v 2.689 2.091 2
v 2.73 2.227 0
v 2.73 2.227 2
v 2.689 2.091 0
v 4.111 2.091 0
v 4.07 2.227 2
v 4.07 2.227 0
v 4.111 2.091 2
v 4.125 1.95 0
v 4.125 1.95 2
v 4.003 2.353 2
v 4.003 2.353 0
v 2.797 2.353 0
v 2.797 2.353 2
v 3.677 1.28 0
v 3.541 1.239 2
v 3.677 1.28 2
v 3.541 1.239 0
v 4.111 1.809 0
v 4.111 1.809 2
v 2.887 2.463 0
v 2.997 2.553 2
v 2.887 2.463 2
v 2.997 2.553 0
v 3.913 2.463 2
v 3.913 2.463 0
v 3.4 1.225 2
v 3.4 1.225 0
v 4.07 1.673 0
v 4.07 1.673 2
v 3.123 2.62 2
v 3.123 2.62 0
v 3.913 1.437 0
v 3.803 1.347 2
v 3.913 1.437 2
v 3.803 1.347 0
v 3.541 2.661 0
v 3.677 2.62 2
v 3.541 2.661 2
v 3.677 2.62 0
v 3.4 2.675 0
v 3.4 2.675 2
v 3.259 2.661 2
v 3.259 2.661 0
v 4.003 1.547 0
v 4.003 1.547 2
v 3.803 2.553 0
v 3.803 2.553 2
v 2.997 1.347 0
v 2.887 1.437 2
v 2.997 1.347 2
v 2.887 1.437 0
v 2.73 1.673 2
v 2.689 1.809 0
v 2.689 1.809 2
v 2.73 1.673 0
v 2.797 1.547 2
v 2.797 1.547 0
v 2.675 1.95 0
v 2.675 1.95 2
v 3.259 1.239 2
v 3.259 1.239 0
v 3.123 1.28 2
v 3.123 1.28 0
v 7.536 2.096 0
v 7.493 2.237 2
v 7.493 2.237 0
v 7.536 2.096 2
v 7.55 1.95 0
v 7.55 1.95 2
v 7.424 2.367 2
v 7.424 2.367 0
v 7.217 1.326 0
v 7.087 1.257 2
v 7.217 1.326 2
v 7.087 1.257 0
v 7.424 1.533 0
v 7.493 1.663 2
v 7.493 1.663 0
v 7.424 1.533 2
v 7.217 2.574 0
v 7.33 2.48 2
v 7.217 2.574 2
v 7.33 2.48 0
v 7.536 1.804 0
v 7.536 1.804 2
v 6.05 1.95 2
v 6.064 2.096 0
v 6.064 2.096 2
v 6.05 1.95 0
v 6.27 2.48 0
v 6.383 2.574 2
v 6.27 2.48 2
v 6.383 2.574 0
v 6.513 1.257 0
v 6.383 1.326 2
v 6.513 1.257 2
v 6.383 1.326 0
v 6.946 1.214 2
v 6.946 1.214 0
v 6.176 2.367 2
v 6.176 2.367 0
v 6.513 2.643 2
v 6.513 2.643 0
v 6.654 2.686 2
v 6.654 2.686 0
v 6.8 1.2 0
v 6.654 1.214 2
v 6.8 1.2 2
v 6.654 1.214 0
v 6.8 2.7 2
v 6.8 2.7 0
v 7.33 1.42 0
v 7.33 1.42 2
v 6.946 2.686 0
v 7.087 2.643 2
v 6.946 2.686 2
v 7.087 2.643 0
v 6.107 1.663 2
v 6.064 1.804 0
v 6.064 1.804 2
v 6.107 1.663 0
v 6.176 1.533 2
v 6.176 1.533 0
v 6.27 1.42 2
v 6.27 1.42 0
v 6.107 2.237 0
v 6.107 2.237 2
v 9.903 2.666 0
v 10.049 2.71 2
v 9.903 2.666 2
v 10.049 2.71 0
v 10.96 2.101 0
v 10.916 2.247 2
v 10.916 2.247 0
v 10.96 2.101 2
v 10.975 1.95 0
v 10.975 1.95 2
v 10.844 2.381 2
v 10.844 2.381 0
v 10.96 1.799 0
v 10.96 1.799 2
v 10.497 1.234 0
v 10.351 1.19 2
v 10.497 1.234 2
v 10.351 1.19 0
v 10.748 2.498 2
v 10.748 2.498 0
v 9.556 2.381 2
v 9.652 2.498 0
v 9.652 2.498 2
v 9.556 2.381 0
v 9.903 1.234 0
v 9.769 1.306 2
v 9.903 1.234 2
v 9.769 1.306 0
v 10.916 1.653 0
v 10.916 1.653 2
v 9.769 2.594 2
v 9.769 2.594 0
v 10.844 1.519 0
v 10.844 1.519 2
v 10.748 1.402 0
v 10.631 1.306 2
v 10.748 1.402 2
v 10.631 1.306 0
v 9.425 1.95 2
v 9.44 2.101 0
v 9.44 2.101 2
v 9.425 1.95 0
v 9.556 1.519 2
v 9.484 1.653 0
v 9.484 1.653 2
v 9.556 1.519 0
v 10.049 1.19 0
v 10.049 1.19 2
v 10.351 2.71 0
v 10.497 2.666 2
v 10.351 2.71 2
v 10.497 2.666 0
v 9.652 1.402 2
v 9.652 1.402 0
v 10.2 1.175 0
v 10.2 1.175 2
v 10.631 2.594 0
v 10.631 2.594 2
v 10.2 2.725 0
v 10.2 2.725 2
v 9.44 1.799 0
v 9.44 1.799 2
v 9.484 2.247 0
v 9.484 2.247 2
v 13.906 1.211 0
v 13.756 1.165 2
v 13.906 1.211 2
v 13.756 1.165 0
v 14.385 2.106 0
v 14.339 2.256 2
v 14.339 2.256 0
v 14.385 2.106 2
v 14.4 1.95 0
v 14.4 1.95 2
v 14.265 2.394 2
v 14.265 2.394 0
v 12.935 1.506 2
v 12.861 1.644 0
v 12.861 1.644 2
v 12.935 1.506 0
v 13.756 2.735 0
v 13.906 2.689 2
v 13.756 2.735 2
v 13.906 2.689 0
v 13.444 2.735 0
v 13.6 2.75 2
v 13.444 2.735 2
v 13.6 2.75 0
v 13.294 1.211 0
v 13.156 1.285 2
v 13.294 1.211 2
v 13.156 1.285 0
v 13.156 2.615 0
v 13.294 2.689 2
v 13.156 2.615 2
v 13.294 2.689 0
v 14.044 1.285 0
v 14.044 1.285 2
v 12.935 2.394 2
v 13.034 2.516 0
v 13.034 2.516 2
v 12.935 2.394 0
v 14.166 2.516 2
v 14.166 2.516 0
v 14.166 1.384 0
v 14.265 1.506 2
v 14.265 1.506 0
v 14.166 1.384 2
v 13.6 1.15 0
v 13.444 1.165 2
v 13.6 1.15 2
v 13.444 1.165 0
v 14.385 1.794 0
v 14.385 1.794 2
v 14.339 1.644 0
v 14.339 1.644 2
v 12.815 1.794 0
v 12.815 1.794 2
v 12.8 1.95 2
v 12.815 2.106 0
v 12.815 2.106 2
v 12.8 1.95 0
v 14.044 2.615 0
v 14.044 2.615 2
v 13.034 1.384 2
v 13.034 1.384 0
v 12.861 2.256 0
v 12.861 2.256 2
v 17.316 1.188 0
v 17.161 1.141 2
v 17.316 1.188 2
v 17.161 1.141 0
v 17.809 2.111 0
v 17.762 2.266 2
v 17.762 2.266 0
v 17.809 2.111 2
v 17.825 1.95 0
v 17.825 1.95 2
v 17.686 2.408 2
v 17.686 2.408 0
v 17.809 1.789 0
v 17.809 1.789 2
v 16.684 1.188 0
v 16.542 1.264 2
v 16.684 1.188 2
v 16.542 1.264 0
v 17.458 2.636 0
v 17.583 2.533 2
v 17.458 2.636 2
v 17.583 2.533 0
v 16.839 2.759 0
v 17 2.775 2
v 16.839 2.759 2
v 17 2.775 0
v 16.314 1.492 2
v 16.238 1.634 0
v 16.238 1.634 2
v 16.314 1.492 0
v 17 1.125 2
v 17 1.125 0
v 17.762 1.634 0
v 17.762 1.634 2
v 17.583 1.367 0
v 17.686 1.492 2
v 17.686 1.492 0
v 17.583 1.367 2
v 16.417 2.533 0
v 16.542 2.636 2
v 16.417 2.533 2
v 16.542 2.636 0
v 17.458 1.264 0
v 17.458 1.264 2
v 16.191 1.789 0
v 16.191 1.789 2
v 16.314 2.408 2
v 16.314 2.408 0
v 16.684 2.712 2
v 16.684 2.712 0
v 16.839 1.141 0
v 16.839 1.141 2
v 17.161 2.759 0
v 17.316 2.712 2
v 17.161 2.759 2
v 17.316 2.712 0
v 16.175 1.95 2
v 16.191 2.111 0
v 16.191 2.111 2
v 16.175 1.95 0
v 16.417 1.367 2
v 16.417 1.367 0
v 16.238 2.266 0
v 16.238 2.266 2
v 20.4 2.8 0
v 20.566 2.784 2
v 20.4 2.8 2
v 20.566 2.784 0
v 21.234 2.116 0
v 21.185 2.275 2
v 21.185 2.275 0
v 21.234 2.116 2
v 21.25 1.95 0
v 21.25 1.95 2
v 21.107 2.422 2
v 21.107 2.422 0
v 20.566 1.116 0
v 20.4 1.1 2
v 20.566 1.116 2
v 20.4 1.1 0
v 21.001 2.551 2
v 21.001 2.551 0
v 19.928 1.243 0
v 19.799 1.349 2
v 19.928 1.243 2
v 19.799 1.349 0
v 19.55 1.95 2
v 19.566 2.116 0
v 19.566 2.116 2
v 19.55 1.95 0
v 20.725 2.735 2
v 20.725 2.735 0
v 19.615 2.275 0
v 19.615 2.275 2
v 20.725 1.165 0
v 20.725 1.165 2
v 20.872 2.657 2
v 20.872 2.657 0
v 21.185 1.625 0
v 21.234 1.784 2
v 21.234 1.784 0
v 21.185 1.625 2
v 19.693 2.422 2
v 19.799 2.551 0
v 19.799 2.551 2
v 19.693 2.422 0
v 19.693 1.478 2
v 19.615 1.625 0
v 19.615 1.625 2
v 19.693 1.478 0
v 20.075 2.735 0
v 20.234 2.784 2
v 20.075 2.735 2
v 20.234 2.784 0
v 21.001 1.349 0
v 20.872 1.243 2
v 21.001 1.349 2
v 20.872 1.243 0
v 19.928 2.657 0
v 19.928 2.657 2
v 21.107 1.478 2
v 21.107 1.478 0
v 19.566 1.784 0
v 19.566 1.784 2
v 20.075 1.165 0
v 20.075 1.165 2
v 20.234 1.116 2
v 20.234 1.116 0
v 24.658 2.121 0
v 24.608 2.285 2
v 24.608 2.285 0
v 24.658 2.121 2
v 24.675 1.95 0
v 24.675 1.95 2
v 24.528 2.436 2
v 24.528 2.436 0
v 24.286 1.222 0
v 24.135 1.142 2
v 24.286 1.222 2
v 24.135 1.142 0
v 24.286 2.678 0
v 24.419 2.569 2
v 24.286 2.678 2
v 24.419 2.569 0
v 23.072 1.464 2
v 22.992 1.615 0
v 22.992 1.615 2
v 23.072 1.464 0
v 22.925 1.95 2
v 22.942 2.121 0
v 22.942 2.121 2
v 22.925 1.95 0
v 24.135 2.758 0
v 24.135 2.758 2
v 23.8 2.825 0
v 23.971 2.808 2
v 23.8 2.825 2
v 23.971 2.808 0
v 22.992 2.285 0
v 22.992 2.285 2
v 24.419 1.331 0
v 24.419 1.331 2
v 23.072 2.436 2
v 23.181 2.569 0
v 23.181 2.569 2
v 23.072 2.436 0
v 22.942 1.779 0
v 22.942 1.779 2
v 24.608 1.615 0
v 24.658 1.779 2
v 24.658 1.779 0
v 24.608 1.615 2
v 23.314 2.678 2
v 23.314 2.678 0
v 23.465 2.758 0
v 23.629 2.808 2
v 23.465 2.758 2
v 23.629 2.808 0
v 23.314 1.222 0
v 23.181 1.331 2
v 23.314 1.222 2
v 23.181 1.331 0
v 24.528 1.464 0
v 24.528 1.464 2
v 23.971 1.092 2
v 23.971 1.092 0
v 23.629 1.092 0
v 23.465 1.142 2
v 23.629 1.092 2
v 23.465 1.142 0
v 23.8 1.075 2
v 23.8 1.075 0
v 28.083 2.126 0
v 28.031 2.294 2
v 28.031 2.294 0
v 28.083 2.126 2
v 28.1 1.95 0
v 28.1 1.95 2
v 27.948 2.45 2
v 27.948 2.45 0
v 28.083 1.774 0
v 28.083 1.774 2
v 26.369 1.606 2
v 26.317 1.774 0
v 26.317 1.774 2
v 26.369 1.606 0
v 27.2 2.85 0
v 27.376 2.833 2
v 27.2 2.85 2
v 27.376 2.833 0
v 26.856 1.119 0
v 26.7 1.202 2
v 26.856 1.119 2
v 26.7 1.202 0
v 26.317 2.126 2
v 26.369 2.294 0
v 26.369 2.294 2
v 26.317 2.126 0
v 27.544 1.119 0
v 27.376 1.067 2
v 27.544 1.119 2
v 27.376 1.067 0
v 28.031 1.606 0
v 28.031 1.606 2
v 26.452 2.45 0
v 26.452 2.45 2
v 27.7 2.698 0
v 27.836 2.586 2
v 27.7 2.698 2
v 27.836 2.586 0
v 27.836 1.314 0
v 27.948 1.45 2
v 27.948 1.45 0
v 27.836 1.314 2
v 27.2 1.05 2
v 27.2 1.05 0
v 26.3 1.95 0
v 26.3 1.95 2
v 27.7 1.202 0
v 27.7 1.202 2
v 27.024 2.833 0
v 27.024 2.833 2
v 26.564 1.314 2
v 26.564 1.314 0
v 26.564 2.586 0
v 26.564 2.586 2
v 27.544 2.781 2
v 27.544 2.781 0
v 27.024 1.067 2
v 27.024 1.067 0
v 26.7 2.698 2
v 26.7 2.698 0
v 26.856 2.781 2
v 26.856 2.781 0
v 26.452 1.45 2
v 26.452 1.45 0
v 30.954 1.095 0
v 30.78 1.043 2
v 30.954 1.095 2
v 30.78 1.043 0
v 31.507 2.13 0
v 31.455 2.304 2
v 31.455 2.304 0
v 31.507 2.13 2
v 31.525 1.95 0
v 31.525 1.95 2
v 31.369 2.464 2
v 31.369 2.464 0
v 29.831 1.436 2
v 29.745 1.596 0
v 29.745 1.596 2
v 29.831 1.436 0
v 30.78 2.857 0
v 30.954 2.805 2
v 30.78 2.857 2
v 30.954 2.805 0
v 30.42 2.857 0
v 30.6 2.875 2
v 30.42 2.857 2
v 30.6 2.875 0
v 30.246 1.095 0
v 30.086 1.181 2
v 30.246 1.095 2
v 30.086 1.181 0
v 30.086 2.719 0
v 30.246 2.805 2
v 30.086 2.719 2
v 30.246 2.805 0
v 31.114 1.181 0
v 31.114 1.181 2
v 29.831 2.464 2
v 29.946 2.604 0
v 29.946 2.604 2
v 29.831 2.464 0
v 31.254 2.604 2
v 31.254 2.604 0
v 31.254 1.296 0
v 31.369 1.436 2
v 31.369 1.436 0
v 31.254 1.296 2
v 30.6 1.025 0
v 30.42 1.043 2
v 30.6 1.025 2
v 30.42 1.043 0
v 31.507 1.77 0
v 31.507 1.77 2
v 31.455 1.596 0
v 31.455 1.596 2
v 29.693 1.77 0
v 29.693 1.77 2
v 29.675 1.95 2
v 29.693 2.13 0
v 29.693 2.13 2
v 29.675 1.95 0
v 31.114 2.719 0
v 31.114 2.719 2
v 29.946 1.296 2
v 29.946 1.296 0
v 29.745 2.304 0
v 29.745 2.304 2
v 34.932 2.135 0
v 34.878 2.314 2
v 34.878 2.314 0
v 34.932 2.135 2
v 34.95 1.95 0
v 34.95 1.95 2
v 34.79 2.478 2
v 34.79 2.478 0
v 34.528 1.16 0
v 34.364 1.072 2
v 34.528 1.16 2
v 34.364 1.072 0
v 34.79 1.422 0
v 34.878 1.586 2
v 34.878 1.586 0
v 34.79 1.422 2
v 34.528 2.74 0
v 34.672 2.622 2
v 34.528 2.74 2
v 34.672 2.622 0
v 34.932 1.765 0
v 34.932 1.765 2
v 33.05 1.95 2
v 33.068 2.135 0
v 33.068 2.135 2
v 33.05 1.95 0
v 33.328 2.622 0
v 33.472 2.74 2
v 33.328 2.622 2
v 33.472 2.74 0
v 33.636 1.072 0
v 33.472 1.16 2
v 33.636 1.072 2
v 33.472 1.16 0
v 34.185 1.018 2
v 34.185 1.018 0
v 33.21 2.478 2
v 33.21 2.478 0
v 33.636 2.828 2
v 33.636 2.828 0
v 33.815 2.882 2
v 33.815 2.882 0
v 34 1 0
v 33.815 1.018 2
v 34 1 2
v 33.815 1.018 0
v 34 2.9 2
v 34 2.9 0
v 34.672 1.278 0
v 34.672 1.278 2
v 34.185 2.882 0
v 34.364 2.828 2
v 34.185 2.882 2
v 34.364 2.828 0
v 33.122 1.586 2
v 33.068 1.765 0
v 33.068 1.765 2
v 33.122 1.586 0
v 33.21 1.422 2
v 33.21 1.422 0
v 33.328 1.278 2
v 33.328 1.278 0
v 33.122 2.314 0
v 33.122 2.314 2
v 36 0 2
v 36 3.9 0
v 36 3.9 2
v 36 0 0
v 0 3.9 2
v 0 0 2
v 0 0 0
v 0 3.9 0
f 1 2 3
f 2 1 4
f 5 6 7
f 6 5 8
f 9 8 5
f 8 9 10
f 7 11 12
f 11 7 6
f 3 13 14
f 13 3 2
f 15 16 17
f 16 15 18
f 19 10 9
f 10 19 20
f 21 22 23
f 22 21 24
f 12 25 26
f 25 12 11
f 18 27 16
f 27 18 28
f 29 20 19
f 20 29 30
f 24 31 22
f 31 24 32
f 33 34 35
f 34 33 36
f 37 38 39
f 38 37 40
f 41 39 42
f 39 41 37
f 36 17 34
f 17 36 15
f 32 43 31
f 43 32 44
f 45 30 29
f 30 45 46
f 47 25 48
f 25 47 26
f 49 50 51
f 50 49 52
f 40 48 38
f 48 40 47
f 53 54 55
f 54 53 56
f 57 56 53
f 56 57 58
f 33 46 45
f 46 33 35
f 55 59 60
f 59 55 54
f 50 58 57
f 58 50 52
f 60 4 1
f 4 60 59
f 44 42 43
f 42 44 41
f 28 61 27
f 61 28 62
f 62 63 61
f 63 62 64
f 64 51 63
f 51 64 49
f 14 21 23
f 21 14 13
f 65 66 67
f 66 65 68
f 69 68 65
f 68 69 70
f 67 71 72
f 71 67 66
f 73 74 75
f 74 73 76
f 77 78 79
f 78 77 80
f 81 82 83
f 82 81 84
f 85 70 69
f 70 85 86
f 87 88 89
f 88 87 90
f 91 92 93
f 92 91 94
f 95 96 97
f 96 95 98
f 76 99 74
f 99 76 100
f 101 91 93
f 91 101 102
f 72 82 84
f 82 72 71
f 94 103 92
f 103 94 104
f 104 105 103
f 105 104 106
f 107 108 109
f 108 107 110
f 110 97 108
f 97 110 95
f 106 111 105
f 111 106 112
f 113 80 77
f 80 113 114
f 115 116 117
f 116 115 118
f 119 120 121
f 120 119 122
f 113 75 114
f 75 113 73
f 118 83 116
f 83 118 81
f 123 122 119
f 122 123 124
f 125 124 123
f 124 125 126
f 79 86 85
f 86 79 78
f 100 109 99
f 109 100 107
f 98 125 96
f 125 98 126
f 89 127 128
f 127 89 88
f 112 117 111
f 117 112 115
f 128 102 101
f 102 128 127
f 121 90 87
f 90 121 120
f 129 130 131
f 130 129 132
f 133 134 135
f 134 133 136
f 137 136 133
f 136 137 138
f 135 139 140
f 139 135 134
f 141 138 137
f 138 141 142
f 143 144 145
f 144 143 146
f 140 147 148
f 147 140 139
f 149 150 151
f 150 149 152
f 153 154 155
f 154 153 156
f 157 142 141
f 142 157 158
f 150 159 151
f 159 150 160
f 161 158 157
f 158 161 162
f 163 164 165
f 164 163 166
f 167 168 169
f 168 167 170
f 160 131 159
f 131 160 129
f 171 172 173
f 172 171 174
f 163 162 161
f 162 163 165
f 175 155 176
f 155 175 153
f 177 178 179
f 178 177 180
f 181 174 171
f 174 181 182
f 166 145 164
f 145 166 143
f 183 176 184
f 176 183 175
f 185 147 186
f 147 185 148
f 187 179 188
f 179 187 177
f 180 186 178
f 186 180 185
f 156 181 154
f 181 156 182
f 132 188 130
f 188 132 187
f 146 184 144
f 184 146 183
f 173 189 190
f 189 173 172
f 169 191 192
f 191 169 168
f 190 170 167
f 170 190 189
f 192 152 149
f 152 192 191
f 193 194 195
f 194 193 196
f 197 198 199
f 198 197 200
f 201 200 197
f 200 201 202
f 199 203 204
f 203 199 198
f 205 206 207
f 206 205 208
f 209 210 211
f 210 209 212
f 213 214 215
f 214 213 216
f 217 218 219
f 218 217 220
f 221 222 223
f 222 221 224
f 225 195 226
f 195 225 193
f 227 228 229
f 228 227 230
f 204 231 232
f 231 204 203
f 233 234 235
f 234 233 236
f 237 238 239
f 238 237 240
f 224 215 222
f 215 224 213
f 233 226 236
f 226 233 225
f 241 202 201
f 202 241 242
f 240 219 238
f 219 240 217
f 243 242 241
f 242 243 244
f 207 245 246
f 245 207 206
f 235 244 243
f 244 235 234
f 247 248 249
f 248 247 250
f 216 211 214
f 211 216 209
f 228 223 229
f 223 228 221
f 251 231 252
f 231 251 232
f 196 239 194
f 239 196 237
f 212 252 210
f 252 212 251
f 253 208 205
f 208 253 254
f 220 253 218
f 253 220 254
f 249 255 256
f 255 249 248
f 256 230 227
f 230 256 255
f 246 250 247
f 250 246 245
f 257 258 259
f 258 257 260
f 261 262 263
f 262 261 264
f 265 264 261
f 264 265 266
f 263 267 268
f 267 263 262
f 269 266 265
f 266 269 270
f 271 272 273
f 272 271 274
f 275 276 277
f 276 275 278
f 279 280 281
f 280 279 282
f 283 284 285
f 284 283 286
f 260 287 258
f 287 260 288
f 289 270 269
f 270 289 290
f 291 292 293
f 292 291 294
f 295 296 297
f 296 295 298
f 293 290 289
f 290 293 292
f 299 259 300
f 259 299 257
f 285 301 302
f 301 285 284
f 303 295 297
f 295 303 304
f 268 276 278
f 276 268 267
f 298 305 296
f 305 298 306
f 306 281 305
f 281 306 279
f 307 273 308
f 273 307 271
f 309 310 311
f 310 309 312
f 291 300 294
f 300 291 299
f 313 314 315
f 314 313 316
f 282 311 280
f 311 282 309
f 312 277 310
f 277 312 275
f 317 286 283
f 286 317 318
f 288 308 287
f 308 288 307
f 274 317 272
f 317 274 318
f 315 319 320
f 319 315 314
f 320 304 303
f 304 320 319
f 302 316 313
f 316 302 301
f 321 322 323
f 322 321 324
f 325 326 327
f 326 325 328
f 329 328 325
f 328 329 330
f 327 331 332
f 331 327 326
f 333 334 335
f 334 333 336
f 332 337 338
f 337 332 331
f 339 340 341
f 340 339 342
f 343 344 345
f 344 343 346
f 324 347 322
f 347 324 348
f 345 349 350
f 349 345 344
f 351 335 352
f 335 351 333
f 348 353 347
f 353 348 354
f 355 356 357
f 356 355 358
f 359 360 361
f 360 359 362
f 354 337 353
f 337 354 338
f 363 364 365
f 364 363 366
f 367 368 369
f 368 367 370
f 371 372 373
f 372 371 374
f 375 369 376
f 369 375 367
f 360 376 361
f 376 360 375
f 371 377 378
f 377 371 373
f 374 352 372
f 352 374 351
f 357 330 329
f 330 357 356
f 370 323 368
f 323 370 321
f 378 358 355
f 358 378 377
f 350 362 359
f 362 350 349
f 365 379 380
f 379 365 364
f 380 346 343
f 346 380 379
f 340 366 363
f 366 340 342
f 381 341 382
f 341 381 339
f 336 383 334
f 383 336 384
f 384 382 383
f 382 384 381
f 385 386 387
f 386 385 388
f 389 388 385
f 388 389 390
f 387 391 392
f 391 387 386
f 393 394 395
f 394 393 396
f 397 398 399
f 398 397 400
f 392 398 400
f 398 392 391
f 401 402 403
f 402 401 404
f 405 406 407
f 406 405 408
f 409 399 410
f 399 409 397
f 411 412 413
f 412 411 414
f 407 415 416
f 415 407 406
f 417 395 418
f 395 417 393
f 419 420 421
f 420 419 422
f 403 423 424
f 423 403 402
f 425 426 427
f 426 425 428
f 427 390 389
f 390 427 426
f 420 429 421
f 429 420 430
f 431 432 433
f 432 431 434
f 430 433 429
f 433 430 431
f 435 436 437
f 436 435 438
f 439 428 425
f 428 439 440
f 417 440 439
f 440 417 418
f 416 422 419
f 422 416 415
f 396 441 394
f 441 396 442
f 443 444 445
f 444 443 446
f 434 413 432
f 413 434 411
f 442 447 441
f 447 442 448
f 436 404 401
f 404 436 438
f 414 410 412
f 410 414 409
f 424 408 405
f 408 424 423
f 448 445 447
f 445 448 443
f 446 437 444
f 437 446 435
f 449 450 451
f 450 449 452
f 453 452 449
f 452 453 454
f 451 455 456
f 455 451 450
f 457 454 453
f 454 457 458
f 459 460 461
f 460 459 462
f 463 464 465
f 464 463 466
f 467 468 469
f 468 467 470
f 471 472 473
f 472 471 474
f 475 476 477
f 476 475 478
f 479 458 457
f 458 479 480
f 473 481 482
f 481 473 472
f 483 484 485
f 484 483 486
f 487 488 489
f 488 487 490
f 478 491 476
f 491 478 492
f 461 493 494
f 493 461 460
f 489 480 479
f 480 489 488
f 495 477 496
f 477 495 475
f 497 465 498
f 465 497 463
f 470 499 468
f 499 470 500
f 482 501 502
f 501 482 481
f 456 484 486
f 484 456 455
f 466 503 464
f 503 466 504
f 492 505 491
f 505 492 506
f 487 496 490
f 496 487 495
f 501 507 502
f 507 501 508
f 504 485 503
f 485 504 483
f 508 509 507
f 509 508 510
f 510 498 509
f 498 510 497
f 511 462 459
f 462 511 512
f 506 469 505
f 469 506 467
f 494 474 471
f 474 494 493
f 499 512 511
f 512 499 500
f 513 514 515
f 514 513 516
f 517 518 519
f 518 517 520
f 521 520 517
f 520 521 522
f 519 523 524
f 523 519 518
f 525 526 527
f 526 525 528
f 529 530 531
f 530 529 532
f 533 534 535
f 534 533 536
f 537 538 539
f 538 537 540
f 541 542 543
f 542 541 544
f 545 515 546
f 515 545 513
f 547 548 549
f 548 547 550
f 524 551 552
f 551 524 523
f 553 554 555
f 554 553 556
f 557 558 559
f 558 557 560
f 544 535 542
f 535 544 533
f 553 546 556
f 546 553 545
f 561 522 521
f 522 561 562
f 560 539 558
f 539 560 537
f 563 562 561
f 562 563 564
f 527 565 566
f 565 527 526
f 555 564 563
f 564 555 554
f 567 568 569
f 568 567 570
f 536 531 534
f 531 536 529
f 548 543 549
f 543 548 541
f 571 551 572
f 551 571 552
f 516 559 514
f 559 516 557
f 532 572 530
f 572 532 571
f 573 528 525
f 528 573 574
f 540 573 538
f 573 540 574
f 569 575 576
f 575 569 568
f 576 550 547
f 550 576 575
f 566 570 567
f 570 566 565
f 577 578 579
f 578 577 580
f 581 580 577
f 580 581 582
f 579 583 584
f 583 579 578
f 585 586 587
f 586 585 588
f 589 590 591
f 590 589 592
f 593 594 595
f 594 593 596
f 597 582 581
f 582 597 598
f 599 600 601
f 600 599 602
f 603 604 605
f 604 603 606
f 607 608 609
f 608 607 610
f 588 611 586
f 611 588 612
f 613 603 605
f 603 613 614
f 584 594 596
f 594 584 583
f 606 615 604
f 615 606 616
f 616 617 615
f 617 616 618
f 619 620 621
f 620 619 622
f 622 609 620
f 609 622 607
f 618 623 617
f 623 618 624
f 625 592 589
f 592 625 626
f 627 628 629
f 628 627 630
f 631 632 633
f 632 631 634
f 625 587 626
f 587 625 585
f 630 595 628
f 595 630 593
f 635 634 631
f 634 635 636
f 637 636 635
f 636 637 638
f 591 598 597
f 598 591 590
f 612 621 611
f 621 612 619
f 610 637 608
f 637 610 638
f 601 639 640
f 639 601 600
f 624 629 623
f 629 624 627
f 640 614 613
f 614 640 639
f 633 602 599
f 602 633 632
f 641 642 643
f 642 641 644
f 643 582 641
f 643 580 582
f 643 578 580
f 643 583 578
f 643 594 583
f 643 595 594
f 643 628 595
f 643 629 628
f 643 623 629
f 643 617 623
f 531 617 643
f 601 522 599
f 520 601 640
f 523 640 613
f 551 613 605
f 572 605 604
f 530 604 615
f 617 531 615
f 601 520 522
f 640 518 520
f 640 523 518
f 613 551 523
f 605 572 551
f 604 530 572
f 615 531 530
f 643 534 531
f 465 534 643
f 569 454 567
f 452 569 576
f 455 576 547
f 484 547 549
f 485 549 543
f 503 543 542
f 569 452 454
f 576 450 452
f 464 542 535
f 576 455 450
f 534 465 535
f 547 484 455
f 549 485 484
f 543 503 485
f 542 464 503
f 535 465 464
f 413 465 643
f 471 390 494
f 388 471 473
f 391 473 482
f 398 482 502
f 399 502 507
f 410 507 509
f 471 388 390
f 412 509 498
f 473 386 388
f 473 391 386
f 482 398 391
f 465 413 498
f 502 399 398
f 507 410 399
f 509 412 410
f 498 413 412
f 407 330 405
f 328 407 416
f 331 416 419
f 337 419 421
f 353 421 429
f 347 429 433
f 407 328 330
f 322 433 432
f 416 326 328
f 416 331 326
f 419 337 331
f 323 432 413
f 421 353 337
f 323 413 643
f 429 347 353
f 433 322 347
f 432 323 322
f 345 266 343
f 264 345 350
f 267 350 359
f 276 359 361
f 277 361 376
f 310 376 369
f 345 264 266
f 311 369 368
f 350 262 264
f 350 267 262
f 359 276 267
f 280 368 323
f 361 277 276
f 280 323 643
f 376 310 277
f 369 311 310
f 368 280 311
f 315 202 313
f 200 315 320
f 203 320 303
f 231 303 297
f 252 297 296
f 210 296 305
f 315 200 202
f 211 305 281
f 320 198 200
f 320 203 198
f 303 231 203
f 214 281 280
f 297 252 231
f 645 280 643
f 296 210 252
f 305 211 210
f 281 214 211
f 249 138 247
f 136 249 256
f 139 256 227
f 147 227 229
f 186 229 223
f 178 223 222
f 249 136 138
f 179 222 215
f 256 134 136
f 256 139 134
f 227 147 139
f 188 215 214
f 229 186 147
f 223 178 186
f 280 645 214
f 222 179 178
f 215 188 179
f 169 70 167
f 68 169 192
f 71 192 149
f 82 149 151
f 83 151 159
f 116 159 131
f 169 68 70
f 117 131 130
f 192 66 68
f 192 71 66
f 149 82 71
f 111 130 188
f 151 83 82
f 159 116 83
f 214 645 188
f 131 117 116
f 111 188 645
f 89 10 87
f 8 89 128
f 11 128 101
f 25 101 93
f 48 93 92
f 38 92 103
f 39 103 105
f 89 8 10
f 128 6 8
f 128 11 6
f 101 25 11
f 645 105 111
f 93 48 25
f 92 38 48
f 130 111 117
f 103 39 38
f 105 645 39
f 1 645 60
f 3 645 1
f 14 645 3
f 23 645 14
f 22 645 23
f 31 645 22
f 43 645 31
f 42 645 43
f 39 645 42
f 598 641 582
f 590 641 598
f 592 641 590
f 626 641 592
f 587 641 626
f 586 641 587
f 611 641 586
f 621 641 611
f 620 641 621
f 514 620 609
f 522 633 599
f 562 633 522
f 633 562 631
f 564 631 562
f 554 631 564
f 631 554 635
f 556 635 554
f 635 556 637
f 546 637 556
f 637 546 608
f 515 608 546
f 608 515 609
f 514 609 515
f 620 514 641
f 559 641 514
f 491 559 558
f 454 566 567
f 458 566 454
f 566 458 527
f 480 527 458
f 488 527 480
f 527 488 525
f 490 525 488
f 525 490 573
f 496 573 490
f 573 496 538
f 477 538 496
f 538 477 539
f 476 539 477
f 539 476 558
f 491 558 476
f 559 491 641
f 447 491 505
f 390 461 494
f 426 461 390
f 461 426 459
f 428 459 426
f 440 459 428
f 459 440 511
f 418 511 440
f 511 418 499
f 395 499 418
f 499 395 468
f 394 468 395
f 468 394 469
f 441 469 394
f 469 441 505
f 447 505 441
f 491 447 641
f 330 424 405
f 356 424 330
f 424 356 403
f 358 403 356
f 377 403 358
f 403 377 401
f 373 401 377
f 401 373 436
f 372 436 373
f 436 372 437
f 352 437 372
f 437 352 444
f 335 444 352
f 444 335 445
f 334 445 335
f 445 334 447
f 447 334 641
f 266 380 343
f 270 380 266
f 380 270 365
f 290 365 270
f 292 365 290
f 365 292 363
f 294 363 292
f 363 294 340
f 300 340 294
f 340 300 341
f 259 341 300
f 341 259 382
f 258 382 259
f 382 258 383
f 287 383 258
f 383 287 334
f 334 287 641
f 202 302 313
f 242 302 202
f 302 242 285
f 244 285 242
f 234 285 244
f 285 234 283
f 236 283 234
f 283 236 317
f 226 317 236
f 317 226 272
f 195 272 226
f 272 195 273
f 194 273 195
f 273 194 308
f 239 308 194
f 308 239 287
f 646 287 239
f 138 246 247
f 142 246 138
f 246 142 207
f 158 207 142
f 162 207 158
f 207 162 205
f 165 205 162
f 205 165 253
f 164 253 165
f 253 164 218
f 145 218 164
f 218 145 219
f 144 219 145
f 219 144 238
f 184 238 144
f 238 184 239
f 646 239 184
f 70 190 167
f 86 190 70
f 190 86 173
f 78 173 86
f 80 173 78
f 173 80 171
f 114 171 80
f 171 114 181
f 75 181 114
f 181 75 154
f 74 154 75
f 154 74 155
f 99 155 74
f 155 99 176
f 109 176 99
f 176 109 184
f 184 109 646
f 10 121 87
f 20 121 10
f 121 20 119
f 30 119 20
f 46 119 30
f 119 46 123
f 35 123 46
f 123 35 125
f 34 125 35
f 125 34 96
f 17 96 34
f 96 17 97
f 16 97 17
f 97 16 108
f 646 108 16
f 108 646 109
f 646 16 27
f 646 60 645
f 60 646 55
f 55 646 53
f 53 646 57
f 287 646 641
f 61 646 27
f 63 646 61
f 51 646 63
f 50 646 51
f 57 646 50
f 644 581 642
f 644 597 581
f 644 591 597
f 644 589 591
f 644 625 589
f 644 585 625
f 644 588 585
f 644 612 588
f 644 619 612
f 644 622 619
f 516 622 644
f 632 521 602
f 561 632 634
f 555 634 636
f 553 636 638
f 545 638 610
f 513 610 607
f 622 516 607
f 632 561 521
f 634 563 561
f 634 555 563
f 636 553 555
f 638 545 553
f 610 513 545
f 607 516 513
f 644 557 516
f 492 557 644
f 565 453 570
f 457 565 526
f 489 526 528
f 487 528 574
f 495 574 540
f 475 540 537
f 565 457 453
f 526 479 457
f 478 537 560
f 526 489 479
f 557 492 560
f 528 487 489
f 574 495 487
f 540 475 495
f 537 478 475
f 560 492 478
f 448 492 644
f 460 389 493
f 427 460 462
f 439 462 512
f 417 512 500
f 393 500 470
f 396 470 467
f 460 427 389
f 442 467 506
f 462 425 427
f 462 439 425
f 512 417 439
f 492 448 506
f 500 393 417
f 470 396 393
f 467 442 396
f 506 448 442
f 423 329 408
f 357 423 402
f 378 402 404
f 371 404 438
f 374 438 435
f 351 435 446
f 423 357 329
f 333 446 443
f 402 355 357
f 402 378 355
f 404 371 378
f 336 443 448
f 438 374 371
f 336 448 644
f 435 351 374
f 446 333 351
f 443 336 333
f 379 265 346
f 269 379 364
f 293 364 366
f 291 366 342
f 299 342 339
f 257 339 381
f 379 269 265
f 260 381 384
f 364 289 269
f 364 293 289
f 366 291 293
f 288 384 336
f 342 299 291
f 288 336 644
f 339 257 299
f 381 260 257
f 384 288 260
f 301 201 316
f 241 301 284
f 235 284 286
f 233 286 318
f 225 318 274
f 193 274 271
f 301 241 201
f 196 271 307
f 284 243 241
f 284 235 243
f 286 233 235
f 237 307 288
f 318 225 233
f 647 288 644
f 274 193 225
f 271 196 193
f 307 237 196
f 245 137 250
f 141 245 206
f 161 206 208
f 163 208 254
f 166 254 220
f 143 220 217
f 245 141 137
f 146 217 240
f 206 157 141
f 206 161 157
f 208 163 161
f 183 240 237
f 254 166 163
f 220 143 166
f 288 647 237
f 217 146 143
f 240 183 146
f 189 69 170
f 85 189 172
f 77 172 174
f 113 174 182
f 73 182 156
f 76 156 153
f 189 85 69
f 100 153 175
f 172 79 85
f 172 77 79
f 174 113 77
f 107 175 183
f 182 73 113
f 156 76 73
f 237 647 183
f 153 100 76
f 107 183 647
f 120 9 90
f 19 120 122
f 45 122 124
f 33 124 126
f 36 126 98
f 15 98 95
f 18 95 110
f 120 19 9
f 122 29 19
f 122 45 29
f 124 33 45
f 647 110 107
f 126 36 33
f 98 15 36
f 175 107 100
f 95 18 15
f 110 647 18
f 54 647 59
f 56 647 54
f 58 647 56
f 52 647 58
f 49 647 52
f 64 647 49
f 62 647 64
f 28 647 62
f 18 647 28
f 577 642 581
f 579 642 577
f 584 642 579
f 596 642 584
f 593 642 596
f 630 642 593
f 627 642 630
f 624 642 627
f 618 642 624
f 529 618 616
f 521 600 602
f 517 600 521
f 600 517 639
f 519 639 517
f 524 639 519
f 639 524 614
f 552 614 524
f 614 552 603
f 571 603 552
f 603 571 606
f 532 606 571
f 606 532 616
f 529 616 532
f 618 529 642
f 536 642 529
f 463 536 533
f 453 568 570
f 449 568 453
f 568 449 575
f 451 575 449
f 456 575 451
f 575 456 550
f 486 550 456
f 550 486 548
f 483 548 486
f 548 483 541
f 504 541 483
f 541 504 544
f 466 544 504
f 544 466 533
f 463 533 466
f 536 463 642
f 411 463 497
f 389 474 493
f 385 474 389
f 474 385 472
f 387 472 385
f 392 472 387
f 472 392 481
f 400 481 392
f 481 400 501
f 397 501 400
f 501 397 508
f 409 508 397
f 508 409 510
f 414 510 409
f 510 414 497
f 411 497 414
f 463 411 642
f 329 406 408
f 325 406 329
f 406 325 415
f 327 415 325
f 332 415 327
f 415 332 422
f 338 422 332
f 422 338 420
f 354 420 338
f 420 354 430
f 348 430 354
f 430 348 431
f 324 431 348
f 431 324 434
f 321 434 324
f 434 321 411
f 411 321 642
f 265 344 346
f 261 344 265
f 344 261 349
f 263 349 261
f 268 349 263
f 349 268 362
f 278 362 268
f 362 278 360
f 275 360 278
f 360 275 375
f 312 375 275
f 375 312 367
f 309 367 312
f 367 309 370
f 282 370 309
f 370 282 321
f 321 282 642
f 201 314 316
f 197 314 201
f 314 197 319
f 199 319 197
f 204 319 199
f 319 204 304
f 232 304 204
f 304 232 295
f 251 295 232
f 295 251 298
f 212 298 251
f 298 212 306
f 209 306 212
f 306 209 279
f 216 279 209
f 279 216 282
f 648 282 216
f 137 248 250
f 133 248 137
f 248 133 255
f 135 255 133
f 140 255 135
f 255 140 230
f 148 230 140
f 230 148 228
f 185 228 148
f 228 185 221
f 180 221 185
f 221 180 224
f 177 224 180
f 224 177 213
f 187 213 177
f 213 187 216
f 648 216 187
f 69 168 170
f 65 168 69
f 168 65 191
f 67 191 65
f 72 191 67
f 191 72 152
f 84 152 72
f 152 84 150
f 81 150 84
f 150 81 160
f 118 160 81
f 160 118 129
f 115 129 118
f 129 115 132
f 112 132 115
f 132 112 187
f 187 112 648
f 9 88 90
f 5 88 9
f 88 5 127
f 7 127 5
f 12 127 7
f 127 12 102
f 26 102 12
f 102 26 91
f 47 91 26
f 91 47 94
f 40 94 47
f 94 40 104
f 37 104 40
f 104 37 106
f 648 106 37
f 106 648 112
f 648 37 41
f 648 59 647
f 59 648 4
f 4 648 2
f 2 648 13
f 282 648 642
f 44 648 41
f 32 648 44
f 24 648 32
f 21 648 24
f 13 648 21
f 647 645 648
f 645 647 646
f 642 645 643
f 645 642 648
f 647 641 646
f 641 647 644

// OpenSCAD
numHoles=10;
increment=0.05;//diameter in mm
minHoleSize=1.4; //value in mm
maxHoleSize=minHoleSize+increment*numHoles;
sheetHeight=2;
padding=1.5;
$fn=32;
difference(){
    
    cube([numHoles*(maxHoleSize+padding+0.2),maxHoleSize+2,sheetHeight]);
    {
        for(i=[1:numHoles]){
            translate([i*(maxHoleSize+padding),maxHoleSize/2+1,-0.1])
            cylinder(d=(minHoleSize+increment*i),h=10);
            }
            
        }



}
